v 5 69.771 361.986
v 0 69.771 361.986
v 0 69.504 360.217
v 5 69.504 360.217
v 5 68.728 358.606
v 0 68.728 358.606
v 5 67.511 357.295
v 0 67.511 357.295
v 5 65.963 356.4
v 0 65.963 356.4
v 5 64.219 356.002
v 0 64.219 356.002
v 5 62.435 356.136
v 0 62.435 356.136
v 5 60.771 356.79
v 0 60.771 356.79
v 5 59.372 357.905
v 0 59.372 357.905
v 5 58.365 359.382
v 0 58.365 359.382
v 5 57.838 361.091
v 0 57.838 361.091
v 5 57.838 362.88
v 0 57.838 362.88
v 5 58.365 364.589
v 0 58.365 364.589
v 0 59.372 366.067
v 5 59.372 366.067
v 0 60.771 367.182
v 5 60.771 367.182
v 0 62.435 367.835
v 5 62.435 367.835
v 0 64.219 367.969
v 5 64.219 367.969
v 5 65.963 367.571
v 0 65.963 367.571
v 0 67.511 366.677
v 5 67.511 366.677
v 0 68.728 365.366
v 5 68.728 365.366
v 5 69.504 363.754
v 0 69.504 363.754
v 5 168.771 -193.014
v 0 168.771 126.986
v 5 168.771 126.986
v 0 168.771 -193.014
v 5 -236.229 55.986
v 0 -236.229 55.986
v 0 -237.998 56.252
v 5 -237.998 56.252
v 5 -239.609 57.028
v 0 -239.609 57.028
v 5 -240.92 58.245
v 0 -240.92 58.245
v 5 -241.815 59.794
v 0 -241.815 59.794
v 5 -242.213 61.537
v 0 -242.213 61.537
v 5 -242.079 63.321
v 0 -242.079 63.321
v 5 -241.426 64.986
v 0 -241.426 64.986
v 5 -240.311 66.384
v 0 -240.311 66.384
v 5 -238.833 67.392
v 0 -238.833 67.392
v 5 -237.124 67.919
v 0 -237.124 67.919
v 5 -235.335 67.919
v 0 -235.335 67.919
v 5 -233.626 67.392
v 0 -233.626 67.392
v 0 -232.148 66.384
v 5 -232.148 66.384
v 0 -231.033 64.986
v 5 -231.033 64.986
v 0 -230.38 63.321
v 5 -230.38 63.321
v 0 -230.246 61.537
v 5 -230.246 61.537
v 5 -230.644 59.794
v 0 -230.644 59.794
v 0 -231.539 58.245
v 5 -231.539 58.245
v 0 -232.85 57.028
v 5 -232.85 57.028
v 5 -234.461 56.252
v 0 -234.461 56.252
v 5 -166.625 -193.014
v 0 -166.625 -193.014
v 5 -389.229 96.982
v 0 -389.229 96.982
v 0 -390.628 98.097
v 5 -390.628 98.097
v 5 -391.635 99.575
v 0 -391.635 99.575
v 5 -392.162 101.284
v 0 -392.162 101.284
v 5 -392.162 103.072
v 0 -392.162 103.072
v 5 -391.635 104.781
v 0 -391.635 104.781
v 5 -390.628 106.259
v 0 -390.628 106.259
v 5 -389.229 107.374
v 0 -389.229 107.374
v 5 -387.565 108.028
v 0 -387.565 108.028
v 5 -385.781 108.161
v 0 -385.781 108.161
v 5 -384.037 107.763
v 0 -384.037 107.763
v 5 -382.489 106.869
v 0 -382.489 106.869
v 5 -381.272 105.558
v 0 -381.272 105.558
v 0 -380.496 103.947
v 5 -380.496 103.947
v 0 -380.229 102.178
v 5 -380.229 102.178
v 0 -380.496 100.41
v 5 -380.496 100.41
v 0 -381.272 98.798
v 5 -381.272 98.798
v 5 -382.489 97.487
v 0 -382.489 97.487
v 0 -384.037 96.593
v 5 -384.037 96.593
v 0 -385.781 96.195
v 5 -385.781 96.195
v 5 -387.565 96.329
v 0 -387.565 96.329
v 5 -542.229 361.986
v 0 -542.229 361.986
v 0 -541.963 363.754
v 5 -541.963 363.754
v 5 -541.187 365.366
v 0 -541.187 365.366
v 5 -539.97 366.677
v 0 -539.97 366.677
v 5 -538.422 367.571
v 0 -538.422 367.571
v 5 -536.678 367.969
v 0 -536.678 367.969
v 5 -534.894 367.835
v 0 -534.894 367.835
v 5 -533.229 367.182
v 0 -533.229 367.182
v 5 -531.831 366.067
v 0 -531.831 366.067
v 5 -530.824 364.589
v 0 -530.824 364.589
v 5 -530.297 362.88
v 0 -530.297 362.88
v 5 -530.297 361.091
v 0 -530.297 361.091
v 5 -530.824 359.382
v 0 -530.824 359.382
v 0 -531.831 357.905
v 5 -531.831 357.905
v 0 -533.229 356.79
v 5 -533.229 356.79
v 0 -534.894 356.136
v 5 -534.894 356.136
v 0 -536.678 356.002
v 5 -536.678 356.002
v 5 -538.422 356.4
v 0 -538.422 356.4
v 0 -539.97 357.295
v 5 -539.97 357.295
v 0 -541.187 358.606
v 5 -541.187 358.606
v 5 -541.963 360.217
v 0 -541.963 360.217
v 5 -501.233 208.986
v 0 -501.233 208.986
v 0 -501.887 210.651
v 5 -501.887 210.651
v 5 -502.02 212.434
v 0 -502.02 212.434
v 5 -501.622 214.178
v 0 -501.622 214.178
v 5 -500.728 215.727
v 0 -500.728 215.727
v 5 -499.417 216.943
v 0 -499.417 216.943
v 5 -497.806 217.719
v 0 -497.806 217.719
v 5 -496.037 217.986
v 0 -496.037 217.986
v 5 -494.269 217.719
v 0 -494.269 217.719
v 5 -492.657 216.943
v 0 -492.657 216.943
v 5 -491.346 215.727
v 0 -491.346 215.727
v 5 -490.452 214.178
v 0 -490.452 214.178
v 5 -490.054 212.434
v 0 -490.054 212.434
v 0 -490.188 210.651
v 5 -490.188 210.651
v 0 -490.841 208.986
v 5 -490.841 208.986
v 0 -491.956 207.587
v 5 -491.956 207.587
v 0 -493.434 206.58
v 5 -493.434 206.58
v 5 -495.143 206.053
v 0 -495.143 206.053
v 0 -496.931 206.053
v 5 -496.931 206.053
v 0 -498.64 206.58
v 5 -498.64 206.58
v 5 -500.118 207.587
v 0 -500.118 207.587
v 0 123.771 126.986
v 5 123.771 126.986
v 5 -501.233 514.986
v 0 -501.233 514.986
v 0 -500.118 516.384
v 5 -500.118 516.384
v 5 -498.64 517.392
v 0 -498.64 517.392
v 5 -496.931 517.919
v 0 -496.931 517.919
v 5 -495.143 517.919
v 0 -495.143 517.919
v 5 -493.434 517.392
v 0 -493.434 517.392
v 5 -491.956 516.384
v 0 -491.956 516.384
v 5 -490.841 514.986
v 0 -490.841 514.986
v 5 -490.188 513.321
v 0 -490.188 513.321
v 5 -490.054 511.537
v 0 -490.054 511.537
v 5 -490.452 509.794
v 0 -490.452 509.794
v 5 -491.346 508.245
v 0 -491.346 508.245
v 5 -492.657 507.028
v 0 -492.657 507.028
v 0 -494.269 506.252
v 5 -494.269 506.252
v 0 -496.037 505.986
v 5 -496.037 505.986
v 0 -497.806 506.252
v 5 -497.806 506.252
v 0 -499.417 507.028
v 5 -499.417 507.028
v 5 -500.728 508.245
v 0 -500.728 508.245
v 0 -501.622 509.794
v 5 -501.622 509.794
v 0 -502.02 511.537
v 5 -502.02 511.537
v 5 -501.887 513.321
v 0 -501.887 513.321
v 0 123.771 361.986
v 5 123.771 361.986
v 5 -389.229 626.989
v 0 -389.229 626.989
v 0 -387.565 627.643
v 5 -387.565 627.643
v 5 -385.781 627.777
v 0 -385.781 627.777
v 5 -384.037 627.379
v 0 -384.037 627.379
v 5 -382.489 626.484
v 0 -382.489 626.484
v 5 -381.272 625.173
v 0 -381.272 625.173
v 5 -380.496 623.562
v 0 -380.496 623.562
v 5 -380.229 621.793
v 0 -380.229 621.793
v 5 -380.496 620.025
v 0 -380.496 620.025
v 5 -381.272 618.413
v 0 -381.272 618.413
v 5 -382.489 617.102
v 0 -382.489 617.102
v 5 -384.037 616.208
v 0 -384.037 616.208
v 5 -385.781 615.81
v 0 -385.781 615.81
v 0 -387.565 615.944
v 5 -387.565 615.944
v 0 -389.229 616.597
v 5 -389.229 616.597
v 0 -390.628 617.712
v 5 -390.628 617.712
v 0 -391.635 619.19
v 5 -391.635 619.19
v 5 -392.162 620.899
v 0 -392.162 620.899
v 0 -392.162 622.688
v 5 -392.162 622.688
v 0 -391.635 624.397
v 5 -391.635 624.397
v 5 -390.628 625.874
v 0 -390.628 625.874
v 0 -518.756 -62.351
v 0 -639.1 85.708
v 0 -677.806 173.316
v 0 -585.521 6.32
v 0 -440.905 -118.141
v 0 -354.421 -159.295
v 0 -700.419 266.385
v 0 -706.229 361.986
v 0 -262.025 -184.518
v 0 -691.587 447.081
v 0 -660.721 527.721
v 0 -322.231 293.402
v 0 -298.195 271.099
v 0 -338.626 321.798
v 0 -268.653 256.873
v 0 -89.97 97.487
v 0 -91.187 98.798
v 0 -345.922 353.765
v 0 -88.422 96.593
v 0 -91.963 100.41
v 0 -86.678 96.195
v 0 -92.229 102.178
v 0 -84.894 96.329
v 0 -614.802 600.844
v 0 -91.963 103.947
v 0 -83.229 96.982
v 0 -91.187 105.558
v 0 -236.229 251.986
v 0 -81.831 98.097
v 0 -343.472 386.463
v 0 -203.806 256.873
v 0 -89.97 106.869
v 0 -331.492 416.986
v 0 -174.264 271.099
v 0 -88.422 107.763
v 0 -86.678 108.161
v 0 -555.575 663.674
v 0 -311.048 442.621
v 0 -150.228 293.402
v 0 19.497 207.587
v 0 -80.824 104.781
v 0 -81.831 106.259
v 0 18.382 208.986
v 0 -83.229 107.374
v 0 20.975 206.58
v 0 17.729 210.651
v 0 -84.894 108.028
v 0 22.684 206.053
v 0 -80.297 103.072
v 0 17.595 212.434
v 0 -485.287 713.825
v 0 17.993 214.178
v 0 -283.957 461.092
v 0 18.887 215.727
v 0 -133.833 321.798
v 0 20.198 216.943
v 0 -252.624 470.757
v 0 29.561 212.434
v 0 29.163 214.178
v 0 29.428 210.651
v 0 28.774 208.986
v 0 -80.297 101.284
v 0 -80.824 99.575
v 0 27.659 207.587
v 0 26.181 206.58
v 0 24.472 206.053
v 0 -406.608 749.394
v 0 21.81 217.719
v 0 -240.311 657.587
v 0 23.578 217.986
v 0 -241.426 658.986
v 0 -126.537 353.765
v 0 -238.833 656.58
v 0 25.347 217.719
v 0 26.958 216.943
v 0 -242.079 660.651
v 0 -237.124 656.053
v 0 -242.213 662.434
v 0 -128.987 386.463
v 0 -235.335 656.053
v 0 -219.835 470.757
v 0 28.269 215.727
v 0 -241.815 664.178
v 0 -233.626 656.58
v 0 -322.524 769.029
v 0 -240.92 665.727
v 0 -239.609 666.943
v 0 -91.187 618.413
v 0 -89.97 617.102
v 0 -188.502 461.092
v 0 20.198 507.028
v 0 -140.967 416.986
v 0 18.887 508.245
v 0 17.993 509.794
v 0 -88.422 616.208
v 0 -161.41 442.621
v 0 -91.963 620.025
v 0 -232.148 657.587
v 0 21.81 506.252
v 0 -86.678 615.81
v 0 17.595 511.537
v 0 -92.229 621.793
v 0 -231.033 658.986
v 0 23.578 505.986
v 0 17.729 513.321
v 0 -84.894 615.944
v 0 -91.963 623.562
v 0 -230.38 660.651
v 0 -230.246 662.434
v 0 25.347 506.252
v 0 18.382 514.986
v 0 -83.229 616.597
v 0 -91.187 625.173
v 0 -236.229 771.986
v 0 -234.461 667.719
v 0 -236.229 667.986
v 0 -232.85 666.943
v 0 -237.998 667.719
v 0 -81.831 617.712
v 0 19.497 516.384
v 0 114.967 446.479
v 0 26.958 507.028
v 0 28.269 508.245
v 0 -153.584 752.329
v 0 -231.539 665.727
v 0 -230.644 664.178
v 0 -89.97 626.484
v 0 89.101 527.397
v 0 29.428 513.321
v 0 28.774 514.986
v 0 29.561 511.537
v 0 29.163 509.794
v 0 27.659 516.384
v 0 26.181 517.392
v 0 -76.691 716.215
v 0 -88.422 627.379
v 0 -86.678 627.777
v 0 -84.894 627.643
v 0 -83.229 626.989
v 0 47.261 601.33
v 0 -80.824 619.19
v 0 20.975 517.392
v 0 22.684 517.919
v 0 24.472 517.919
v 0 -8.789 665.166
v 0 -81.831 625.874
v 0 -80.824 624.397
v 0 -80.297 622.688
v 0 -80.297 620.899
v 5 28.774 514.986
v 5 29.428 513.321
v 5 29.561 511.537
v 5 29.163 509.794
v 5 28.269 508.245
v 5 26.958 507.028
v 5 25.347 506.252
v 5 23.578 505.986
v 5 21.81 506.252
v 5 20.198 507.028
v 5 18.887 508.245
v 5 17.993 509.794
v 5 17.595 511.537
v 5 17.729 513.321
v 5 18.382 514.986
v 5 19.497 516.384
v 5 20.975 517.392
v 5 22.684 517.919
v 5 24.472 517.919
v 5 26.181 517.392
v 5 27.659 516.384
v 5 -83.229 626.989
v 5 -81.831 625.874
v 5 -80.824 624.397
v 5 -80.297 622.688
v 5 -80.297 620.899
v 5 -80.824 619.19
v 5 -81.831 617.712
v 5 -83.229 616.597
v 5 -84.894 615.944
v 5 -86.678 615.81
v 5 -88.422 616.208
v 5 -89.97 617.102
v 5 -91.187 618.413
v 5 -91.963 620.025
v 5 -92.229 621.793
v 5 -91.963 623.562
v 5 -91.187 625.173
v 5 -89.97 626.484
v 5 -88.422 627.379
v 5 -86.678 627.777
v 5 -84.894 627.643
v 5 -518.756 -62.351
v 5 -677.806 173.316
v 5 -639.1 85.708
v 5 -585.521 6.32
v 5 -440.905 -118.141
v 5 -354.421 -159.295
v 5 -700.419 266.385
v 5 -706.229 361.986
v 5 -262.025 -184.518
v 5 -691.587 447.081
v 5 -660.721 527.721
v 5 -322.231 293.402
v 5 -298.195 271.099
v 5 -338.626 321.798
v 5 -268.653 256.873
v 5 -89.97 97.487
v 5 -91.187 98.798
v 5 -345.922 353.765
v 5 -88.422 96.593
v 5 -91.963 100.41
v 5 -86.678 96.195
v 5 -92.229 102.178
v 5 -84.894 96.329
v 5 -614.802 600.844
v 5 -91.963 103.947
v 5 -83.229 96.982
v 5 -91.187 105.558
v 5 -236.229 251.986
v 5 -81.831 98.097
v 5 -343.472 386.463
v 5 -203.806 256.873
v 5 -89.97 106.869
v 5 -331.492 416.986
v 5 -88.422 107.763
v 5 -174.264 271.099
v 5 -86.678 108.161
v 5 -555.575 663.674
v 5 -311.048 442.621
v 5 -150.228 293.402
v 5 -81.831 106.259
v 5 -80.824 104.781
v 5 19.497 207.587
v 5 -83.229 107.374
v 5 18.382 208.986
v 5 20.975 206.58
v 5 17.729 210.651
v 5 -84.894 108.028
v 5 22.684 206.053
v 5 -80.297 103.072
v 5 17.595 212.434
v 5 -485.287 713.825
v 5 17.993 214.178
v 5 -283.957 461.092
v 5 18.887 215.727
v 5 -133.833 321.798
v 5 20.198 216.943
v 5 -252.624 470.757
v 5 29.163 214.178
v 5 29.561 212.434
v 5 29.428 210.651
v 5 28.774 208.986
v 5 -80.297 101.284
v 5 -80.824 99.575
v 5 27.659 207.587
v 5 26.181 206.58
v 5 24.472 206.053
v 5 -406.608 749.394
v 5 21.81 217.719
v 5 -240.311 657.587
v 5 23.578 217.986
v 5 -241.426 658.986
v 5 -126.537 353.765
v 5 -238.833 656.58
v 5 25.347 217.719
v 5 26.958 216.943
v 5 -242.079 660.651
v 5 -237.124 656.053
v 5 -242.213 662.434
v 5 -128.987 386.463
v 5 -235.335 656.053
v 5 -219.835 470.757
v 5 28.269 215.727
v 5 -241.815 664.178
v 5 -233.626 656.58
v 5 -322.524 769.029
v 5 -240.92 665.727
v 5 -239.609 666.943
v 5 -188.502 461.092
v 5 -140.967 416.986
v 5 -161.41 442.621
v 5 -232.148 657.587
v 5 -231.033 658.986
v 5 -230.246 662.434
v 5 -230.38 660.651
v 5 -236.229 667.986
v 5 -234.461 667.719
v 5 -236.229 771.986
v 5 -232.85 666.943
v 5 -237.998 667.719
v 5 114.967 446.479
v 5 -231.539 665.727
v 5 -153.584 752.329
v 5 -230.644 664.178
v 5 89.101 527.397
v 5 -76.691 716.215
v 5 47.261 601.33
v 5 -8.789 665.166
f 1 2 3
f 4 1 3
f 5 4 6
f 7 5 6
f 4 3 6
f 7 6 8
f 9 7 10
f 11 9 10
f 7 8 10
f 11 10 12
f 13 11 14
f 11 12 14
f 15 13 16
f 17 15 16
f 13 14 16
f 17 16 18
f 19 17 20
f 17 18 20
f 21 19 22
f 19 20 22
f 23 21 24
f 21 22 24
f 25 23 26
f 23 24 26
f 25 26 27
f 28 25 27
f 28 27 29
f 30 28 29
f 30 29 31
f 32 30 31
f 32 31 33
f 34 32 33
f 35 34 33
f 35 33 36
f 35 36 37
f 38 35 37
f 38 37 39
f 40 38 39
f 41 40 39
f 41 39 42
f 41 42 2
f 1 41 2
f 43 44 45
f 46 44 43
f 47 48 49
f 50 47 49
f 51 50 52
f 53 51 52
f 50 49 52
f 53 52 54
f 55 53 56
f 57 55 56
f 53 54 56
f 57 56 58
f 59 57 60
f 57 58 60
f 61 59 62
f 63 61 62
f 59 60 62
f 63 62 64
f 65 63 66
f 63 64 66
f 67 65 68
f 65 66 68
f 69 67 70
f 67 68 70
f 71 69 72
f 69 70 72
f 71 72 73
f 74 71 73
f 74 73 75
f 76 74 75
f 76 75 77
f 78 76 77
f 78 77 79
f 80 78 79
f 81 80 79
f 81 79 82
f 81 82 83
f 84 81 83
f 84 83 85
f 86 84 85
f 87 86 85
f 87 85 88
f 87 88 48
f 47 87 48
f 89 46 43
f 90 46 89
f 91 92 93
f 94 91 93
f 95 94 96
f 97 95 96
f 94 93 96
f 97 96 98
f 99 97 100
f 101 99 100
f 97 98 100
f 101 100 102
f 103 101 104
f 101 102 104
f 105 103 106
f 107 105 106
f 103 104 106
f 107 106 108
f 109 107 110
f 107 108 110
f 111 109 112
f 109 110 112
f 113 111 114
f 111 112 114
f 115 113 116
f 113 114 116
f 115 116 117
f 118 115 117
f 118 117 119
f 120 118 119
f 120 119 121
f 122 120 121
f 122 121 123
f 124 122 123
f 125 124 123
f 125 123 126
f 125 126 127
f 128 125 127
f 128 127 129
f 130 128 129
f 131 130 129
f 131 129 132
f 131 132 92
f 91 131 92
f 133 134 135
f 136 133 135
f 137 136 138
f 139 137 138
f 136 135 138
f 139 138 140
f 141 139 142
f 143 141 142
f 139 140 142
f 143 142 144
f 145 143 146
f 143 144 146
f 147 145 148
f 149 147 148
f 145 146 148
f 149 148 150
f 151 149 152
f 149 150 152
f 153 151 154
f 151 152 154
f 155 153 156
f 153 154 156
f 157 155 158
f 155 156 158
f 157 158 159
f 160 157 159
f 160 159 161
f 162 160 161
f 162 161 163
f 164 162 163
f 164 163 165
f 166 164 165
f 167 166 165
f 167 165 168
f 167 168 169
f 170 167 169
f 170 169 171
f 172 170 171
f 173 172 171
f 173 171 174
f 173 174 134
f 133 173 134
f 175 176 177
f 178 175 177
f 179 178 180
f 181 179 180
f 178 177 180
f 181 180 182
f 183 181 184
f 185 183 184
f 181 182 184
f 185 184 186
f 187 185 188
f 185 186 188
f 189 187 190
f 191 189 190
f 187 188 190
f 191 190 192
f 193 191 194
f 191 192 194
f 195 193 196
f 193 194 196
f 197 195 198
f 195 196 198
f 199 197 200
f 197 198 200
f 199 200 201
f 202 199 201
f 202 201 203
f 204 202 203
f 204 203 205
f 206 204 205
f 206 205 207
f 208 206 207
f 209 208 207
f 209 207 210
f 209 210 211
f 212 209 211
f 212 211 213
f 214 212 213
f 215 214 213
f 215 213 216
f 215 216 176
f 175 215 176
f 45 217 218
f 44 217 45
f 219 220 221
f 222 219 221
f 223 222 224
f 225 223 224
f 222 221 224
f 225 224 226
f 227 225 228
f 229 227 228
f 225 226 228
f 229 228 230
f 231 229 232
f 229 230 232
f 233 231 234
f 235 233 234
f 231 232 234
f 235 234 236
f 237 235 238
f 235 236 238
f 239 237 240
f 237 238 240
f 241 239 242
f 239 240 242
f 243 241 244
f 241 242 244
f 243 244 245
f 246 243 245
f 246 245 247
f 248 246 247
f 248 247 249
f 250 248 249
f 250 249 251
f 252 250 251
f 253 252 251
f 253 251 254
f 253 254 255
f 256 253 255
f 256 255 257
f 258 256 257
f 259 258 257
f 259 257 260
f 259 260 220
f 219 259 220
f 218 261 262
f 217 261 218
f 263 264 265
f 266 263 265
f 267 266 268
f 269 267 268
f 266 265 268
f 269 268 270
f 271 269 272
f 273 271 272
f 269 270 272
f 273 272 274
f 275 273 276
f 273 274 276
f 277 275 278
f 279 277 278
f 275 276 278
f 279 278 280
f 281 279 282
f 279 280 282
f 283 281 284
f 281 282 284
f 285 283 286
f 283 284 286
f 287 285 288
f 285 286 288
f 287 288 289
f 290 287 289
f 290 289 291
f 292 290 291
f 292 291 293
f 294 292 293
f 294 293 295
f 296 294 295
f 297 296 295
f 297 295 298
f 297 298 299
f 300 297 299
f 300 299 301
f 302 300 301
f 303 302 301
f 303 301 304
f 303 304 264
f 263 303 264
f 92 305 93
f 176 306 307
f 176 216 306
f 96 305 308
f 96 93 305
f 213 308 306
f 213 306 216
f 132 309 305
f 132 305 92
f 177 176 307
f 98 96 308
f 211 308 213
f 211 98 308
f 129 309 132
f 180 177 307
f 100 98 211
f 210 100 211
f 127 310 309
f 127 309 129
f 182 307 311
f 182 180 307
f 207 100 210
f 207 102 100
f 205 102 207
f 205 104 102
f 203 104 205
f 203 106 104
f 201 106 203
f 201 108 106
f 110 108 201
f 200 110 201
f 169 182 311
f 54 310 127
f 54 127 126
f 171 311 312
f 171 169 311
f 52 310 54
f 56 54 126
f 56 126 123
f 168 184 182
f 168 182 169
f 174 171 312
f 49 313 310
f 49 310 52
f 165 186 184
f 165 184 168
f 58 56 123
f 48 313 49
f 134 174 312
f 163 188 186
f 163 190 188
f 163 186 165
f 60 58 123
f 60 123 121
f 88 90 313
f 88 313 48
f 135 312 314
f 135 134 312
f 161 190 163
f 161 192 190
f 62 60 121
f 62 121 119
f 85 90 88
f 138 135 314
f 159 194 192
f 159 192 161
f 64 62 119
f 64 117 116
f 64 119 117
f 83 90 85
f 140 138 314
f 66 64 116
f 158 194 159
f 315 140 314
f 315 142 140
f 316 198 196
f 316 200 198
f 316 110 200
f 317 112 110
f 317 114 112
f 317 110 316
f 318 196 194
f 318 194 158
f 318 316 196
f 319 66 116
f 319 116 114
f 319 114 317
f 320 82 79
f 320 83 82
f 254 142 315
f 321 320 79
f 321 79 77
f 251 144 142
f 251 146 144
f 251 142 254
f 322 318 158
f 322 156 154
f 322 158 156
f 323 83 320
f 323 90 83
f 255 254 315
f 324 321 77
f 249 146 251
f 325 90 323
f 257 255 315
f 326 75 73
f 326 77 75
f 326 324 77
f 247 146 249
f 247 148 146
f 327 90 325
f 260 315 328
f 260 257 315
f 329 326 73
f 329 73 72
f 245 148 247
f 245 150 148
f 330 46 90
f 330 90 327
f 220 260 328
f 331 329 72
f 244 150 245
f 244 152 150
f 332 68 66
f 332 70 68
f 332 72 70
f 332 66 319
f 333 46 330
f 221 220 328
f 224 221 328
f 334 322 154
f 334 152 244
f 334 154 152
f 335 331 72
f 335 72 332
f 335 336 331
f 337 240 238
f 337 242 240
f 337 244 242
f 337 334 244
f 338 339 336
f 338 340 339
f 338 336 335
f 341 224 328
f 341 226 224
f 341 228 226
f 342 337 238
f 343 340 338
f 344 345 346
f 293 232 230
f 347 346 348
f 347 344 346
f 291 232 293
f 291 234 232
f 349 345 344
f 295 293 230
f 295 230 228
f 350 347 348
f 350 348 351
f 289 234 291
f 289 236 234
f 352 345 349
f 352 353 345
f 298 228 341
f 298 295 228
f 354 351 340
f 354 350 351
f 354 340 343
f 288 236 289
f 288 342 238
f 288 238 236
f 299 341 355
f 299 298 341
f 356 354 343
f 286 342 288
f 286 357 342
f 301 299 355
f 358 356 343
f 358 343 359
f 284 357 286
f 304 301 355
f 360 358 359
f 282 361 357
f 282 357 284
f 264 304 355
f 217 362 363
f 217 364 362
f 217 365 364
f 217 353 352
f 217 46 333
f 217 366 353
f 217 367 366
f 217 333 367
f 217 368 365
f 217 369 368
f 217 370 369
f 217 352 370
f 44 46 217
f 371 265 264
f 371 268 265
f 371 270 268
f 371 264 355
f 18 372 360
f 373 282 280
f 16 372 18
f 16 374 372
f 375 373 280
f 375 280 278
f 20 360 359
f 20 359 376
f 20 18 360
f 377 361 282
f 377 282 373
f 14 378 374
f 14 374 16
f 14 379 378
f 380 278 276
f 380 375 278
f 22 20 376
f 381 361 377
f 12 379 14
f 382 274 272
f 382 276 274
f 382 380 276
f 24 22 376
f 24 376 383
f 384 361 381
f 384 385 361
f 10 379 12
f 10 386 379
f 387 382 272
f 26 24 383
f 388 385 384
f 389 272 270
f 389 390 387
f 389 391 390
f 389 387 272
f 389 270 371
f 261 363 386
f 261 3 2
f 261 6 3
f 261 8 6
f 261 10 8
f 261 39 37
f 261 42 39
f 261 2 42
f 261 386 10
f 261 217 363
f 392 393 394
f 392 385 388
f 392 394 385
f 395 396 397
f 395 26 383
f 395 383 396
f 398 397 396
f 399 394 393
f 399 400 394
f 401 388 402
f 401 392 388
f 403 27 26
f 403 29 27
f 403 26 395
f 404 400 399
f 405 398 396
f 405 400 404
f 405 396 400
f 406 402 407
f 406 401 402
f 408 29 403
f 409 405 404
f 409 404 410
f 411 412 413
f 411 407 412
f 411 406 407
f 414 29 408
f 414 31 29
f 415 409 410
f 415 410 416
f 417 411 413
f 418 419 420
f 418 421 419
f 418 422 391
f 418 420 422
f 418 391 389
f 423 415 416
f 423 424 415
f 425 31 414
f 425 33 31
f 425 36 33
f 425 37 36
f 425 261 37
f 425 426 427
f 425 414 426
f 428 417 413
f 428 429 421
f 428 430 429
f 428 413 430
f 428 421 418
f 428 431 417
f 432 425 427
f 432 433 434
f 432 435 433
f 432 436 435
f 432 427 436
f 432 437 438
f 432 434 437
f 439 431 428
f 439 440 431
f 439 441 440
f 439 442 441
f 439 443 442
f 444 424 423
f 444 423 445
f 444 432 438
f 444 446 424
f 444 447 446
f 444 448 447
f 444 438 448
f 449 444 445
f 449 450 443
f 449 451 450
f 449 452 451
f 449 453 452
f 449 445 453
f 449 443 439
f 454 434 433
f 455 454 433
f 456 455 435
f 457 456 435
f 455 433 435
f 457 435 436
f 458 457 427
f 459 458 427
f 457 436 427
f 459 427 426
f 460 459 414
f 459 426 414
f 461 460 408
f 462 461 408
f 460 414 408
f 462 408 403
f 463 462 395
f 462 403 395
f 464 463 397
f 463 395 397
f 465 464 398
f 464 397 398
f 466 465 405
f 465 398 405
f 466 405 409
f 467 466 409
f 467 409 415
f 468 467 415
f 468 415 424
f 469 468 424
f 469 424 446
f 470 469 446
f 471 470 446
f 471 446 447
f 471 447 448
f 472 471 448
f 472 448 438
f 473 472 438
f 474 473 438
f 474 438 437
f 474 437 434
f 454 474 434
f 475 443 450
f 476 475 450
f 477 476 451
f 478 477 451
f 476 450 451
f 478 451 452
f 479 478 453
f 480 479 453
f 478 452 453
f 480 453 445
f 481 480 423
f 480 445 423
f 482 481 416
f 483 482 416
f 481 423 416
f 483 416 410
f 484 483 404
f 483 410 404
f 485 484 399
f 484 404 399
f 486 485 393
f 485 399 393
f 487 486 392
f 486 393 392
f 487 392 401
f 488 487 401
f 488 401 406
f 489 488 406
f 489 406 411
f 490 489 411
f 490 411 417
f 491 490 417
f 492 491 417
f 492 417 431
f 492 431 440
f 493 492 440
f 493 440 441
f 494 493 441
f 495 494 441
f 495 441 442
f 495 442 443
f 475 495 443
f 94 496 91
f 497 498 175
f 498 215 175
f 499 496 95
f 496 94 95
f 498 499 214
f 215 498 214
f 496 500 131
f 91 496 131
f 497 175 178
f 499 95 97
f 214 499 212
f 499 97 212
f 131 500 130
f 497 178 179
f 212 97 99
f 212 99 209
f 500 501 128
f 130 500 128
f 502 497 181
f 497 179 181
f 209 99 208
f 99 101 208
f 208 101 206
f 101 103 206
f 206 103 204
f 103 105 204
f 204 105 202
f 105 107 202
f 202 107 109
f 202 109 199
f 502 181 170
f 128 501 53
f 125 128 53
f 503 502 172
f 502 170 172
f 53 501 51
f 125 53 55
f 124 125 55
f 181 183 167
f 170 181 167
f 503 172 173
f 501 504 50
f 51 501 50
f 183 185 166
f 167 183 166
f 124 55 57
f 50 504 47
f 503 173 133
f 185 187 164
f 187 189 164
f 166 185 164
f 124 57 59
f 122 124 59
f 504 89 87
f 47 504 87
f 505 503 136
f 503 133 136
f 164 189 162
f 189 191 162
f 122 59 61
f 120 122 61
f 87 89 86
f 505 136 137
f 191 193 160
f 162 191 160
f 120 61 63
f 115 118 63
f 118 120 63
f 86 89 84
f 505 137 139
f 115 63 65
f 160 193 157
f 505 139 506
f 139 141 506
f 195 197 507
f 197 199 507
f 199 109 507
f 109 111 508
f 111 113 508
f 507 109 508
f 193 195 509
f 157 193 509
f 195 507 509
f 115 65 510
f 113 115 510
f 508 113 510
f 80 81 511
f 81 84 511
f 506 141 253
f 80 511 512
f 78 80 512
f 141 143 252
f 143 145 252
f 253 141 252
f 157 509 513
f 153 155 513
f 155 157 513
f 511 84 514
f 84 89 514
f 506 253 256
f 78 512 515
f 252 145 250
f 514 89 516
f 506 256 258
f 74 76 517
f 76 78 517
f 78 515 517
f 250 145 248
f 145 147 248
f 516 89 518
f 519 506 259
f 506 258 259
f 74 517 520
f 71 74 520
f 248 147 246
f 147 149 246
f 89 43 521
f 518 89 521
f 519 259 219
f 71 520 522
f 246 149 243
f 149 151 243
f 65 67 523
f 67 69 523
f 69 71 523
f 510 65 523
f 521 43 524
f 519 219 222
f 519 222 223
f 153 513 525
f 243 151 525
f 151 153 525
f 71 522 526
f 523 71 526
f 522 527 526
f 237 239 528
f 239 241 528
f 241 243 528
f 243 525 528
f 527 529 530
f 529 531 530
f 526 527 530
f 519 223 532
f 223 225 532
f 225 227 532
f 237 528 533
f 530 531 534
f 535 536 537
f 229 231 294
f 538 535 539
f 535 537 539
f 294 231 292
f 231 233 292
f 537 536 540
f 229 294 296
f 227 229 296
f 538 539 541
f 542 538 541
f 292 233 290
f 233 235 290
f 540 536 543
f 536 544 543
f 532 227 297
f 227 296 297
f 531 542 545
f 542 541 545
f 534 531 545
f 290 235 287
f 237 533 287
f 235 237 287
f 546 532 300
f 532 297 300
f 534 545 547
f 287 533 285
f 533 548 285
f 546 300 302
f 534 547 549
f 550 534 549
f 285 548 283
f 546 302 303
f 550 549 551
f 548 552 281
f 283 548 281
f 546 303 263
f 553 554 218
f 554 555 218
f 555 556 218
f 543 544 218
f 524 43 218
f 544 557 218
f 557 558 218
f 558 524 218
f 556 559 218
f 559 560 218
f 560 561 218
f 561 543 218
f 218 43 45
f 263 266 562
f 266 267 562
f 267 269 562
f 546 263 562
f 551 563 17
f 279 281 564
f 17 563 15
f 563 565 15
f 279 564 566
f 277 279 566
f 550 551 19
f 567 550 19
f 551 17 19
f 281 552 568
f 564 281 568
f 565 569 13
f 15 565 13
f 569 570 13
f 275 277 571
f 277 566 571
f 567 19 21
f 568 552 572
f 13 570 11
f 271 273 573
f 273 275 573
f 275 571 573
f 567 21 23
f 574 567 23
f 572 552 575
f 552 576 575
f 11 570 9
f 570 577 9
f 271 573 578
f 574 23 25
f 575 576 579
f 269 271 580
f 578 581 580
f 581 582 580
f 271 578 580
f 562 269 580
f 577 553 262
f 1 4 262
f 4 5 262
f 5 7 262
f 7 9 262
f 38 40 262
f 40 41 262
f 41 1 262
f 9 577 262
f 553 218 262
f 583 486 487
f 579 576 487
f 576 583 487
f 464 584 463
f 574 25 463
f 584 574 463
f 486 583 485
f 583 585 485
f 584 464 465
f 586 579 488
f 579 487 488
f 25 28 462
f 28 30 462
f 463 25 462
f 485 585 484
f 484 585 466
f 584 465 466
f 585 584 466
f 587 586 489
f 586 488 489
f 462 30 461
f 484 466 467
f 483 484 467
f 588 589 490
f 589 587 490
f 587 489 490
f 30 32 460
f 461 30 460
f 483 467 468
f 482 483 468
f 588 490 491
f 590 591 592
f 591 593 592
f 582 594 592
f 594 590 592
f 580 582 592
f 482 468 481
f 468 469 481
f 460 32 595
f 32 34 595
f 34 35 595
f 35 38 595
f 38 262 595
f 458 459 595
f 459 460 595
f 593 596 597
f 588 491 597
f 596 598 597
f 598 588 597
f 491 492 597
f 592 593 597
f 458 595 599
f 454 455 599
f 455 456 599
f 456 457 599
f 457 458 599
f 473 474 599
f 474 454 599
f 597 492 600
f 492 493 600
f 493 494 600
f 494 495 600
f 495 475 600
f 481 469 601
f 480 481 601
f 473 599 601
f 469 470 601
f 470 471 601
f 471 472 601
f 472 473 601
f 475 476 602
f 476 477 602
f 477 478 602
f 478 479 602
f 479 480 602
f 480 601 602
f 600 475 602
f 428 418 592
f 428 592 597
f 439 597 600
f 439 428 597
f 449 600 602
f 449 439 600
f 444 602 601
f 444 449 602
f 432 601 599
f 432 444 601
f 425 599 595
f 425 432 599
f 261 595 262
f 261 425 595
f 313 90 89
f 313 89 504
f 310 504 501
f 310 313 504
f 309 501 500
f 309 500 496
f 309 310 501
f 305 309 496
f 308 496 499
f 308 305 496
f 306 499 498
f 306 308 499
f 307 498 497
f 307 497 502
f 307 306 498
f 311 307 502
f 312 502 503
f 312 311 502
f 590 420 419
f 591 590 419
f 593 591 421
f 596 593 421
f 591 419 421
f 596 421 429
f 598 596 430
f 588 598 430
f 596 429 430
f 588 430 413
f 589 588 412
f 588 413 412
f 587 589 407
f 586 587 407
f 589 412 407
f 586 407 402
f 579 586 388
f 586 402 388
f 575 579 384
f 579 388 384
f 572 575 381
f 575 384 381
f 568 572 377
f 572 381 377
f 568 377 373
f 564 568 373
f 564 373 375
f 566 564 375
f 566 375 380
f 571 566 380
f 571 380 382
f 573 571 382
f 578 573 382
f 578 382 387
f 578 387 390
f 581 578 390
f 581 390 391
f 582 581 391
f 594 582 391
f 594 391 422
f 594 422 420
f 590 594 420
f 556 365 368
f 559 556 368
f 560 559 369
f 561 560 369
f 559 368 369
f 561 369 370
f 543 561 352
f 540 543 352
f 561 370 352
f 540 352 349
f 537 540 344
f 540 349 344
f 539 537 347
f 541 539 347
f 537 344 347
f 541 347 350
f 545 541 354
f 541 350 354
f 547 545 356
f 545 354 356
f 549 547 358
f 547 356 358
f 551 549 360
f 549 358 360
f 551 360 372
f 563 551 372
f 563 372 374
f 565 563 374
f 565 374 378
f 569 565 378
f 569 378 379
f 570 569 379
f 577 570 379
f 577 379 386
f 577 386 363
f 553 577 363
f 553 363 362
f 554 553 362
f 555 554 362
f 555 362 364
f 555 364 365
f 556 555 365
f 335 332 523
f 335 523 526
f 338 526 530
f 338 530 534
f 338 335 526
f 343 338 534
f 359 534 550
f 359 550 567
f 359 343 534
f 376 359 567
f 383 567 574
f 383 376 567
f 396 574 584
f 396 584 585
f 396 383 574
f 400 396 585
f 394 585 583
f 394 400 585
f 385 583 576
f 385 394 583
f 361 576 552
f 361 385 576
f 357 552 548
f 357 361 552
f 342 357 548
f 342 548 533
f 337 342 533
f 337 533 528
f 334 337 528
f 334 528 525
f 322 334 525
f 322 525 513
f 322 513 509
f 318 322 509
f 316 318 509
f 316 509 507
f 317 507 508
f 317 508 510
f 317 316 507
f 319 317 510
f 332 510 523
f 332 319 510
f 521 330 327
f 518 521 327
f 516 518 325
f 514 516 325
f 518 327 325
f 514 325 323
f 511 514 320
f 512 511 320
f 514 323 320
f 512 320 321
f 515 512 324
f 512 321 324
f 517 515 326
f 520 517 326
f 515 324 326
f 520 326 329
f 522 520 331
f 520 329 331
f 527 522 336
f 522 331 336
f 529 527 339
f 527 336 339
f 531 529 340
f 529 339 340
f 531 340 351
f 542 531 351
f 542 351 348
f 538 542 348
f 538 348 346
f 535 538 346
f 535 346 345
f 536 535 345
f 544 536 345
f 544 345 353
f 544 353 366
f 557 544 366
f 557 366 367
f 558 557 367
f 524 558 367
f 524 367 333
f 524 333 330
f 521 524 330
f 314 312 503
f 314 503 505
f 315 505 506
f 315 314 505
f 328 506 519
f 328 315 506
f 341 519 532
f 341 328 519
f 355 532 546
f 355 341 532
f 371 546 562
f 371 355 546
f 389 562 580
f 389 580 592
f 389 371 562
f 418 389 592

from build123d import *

# Parameters (mm, degrees)
SKETCH1_R           = 110
BOSS_EXTRUDE1_DEPTH = 5
SKETCH2_R           = 6
CUT_EXTRUDE1_DEPTH  = 10
CIRPATTERN1_COUNT   = 12


with BuildPart() as part:
    # Sketch1 → Boss-Extrude1 (new body)
    with BuildSketch(Plane(origin=(0, 0, 0), x_dir=(0, 0, -1), z_dir=(1, 0, 0))):
        with BuildLine():
            Line((-126.985698369, 168.770507744), (193.014301631, 168.770507744))
            Line((193.014301631, 168.770507744), (193.014301631, -166.625210225))
            ThreePointArc((193.014301631, -166.625210225), (29.499330124, -553.664543235), (-361.985698369, -706.229492256))
            ThreePointArc((-361.985698369, -706.229492256), (-663.674001264, -555.574607548), (-771.985698369, -236.229492256))
            ThreePointArc((-771.985698369, -236.229492256), (-634.689640971, 20.877775707), (-361.985698369, 123.770507744))
            Line((-361.985698369, 123.770507744), (-126.985698369, 123.770507744))
            Line((-126.985698369, 123.770507744), (-126.985698369, 168.770507744))
        make_face()
        with Locations((-361.985698369, -236.229492256)):
            Circle(SKETCH1_R, mode=Mode.SUBTRACT)
    extrude(amount=BOSS_EXTRUDE1_DEPTH)

    # Sketch2 → Cut-Extrude1 (cut)
    with BuildSketch(Plane.ZY):
        with Locations((661.985698369, -236.229492256)):
            Circle(SKETCH2_R)
    cut_extrude1 = extrude(amount=-CUT_EXTRUDE1_DEPTH, mode=Mode.SUBTRACT)

    # CirPattern1: Cut-Extrude1 ×12 about axis
    cirpattern1_axis = Axis((0, -236.229492256, 361.985698369), (1, 0, 0))
    for i in range(1, CIRPATTERN1_COUNT):
        add(cut_extrude1.rotate(cirpattern1_axis, i * 360 / CIRPATTERN1_COUNT), mode=Mode.SUBTRACT)


solid = part.part
